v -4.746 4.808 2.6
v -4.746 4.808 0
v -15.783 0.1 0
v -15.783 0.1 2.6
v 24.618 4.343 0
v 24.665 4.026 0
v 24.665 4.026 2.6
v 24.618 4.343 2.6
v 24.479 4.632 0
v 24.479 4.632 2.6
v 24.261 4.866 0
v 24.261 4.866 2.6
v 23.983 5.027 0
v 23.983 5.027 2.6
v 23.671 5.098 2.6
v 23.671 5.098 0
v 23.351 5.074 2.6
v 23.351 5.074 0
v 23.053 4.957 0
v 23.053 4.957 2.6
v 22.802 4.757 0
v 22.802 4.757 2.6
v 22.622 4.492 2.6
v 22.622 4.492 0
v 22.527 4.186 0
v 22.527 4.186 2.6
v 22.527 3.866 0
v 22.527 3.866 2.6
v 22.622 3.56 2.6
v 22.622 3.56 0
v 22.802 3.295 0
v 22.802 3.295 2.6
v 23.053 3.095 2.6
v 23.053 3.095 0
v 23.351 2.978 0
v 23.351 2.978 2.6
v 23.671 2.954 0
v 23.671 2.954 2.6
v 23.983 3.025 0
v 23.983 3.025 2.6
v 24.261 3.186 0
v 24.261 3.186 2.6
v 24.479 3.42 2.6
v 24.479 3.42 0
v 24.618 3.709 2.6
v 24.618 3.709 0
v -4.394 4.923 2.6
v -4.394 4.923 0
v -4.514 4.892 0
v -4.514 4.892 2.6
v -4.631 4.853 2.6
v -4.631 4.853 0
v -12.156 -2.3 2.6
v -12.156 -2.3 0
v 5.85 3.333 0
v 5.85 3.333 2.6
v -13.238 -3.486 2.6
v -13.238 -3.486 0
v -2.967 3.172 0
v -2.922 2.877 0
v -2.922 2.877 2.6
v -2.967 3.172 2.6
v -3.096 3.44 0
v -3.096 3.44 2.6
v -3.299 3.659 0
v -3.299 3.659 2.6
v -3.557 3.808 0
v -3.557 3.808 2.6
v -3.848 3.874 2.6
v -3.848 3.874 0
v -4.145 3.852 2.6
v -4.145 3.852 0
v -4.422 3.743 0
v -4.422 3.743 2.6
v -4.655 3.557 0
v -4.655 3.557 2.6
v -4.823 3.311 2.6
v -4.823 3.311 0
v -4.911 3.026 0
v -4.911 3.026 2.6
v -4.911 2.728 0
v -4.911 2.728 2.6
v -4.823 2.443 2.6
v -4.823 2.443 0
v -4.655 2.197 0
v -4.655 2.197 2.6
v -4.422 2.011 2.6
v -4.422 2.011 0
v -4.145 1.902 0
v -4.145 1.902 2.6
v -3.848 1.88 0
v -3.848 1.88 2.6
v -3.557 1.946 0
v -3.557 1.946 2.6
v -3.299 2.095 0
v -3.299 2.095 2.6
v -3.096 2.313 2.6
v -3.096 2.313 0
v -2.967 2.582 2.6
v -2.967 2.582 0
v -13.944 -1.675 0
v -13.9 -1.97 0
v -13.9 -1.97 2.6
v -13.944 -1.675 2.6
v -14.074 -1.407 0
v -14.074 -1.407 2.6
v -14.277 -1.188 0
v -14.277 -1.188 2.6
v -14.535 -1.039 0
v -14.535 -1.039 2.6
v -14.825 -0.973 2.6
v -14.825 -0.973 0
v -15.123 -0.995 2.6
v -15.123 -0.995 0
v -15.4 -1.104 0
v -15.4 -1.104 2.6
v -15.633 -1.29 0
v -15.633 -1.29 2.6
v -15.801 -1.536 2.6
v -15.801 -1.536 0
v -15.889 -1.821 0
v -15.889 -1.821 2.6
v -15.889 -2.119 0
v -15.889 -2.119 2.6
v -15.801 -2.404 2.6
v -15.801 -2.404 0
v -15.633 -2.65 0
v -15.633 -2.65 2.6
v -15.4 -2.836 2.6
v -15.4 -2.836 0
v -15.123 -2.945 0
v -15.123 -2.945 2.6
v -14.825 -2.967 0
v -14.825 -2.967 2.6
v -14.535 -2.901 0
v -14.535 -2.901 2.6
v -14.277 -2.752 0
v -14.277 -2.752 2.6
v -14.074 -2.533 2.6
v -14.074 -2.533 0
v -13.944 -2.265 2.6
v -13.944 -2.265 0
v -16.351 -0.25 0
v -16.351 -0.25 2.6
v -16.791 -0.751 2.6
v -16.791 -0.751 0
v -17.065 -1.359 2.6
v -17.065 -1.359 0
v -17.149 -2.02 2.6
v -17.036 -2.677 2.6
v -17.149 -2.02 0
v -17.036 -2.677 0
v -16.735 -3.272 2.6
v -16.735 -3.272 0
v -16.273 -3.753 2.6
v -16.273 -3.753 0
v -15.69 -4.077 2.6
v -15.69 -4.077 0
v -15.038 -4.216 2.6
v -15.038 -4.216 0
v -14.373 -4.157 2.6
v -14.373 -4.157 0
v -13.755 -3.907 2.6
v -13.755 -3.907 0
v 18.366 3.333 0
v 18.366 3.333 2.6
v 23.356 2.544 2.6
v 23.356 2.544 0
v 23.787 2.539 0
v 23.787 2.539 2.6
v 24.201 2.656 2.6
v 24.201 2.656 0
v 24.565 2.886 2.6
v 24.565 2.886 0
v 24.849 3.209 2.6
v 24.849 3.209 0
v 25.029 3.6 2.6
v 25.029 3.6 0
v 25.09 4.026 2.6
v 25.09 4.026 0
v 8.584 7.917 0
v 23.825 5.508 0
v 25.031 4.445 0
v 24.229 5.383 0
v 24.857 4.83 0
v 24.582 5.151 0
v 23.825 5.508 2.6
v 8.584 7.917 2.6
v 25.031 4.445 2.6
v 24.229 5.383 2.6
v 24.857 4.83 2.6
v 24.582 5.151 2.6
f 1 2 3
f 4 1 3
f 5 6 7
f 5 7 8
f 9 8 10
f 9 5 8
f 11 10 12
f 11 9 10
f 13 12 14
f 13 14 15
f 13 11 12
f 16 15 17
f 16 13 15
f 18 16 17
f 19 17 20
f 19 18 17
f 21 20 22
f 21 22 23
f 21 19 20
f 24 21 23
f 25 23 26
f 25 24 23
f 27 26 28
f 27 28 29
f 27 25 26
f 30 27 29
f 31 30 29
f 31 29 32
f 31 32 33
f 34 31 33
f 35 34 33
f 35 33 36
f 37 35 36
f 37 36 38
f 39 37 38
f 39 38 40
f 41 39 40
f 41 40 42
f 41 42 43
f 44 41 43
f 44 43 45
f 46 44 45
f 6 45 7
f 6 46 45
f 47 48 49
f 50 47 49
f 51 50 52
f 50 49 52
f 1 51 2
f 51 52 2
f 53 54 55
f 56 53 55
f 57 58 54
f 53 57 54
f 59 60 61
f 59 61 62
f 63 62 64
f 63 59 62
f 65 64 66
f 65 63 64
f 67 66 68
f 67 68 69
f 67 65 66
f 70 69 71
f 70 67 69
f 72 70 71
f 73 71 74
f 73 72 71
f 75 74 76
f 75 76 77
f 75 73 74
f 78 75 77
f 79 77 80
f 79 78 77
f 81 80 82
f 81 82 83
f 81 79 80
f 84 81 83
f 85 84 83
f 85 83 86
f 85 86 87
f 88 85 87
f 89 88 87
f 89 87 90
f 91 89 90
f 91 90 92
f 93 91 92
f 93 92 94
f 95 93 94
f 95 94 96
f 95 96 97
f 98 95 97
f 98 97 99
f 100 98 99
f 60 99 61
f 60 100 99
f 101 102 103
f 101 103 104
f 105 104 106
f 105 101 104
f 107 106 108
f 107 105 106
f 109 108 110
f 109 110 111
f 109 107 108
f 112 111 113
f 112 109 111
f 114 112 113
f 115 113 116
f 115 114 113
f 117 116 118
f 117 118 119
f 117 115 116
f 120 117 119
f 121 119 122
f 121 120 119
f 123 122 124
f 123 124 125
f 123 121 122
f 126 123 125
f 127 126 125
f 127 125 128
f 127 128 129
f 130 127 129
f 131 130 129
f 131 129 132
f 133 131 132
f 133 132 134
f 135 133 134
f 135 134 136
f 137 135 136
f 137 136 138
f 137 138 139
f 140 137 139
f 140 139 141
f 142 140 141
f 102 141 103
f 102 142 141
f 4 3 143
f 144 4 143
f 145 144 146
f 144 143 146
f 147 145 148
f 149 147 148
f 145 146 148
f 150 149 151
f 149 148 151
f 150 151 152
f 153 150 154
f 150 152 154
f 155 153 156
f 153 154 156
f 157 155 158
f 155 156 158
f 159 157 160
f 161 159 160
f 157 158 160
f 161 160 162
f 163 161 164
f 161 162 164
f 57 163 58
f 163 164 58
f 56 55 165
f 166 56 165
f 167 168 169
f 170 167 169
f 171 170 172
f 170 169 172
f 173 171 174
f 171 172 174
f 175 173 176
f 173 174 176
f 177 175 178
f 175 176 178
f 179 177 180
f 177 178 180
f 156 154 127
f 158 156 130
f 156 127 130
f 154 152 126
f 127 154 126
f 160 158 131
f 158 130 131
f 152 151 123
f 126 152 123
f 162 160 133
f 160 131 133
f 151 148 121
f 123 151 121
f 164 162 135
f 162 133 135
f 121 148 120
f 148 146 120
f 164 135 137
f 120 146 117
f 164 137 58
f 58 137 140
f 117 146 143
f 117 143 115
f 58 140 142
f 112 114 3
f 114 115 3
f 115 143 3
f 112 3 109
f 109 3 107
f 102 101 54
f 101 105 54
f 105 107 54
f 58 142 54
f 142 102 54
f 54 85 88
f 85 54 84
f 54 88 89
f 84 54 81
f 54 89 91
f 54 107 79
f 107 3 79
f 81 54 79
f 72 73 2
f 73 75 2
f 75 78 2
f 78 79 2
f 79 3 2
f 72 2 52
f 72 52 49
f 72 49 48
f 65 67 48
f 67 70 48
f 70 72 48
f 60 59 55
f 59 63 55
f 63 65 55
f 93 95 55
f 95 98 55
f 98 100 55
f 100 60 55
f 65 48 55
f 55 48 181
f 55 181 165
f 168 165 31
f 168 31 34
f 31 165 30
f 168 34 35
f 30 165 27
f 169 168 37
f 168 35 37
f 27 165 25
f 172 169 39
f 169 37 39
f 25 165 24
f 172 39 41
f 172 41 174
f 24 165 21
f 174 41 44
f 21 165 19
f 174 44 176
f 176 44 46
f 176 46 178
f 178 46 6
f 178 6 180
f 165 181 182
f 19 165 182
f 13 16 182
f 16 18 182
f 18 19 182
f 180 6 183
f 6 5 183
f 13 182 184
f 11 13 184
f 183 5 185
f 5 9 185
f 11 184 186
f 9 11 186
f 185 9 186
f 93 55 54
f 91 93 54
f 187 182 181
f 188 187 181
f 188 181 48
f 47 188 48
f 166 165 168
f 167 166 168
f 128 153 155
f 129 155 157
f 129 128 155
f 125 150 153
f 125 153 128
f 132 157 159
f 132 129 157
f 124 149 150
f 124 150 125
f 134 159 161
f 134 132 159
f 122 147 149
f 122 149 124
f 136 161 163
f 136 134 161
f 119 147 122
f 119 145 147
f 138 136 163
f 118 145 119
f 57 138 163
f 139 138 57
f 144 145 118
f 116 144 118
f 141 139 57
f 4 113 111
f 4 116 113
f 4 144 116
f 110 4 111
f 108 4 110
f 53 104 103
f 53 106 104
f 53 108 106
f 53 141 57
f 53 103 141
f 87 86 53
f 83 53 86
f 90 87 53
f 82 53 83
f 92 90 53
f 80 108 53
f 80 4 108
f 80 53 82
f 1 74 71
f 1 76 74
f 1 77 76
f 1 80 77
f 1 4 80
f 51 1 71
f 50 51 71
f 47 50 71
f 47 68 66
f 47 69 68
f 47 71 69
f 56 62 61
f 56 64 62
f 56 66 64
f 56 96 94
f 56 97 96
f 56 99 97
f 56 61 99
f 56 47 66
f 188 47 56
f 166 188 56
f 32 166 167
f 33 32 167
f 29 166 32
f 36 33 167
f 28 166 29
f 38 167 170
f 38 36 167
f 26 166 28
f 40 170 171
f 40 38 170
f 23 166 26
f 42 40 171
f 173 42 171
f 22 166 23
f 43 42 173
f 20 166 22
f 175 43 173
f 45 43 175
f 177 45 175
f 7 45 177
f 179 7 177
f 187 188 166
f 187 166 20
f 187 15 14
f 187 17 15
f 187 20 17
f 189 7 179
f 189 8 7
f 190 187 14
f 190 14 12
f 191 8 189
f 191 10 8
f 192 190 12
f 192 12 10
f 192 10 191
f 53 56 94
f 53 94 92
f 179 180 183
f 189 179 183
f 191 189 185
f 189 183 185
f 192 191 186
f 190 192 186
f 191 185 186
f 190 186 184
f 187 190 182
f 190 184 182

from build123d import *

# Parameters (mm, degrees)
F0_R     = 1
F0_R_2   = 1.075
F1_DEPTH = 2.6


with BuildPart() as f1:
    # F0 (on Top) → F1 (new body)
    with BuildSketch(Plane.XY):
        with BuildLine():
            ThreePointArc((-4.746486, 4.808329), (-5.079824, 1.124576), (-1.822392, 2.876799))
            ThreePointArc((-1.822392, 2.876799), (-2.614969, 4.520158), (-4.394433, 4.923045))
            ThreePointArc((-4.394433, 4.923045), (-4.572993, 4.873462), (-4.746486, 4.808329))
        make_face()
        with Locations((-3.922381, 2.876799)):
            Circle(F0_R, mode=Mode.SUBTRACT)
        with BuildLine():
            ThreePointArc((-4.394433, 4.923045), (-2.614969, 4.520158), (-1.822392, 2.876799))
            ThreePointArc((-1.822392, 2.876799), (-5.079824, 1.124576), (-4.746486, 4.808329))
            Line((-4.746486, 4.808329), (-15.782993, 0.099507))
            ThreePointArc((-15.782993, 0.099507), (-13.659897, -0.09261), (-12.65002, -1.97))
            ThreePointArc((-12.65002, -1.97), (-12.802118, -2.78321), (-13.237851, -3.486475))
            Line((-13.237851, -3.486475), (-12.155538, -2.30018))
            Line((-12.155538, -2.30018), (5.849769, 3.333367))
            Line((5.849769, 3.333367), (18.365619, 3.333367))
            Line((18.365619, 3.333367), (23.356251, 2.544399))
            ThreePointArc((23.356251, 2.544399), (22.108876, 4.260224), (23.824702, 5.507599))
            Line((23.824702, 5.507599), (8.583845, 7.917022))
            Line((8.583845, 7.917022), (-4.394433, 4.923045))
        make_face()
        with BuildLine():
            ThreePointArc((-12.65002, -1.97), (-13.659897, -0.09261), (-15.782993, 0.099507))
            ThreePointArc((-15.782993, 0.099507), (-16.73485, -3.272267), (-13.237851, -3.486475))
            ThreePointArc((-13.237851, -3.486475), (-12.802118, -2.78321), (-12.65002, -1.97))
        make_face()
        with Locations((-14.90002, -1.97)):
            Circle(F0_R, mode=Mode.SUBTRACT)
        with BuildLine():
            ThreePointArc((25.090476, 4.025999), (24.730945, 5.000335), (23.824702, 5.507599))
            ThreePointArc((23.824702, 5.507599), (22.108876, 4.260224), (23.356251, 2.544399))
            ThreePointArc((23.356251, 2.544399), (24.564812, 2.88553), (25.090476, 4.025999))
        make_face()
        with Locations((23.590476, 4.025999)):
            Circle(F0_R_2, mode=Mode.SUBTRACT)
    extrude(amount=F1_DEPTH)


solid = f1.part
